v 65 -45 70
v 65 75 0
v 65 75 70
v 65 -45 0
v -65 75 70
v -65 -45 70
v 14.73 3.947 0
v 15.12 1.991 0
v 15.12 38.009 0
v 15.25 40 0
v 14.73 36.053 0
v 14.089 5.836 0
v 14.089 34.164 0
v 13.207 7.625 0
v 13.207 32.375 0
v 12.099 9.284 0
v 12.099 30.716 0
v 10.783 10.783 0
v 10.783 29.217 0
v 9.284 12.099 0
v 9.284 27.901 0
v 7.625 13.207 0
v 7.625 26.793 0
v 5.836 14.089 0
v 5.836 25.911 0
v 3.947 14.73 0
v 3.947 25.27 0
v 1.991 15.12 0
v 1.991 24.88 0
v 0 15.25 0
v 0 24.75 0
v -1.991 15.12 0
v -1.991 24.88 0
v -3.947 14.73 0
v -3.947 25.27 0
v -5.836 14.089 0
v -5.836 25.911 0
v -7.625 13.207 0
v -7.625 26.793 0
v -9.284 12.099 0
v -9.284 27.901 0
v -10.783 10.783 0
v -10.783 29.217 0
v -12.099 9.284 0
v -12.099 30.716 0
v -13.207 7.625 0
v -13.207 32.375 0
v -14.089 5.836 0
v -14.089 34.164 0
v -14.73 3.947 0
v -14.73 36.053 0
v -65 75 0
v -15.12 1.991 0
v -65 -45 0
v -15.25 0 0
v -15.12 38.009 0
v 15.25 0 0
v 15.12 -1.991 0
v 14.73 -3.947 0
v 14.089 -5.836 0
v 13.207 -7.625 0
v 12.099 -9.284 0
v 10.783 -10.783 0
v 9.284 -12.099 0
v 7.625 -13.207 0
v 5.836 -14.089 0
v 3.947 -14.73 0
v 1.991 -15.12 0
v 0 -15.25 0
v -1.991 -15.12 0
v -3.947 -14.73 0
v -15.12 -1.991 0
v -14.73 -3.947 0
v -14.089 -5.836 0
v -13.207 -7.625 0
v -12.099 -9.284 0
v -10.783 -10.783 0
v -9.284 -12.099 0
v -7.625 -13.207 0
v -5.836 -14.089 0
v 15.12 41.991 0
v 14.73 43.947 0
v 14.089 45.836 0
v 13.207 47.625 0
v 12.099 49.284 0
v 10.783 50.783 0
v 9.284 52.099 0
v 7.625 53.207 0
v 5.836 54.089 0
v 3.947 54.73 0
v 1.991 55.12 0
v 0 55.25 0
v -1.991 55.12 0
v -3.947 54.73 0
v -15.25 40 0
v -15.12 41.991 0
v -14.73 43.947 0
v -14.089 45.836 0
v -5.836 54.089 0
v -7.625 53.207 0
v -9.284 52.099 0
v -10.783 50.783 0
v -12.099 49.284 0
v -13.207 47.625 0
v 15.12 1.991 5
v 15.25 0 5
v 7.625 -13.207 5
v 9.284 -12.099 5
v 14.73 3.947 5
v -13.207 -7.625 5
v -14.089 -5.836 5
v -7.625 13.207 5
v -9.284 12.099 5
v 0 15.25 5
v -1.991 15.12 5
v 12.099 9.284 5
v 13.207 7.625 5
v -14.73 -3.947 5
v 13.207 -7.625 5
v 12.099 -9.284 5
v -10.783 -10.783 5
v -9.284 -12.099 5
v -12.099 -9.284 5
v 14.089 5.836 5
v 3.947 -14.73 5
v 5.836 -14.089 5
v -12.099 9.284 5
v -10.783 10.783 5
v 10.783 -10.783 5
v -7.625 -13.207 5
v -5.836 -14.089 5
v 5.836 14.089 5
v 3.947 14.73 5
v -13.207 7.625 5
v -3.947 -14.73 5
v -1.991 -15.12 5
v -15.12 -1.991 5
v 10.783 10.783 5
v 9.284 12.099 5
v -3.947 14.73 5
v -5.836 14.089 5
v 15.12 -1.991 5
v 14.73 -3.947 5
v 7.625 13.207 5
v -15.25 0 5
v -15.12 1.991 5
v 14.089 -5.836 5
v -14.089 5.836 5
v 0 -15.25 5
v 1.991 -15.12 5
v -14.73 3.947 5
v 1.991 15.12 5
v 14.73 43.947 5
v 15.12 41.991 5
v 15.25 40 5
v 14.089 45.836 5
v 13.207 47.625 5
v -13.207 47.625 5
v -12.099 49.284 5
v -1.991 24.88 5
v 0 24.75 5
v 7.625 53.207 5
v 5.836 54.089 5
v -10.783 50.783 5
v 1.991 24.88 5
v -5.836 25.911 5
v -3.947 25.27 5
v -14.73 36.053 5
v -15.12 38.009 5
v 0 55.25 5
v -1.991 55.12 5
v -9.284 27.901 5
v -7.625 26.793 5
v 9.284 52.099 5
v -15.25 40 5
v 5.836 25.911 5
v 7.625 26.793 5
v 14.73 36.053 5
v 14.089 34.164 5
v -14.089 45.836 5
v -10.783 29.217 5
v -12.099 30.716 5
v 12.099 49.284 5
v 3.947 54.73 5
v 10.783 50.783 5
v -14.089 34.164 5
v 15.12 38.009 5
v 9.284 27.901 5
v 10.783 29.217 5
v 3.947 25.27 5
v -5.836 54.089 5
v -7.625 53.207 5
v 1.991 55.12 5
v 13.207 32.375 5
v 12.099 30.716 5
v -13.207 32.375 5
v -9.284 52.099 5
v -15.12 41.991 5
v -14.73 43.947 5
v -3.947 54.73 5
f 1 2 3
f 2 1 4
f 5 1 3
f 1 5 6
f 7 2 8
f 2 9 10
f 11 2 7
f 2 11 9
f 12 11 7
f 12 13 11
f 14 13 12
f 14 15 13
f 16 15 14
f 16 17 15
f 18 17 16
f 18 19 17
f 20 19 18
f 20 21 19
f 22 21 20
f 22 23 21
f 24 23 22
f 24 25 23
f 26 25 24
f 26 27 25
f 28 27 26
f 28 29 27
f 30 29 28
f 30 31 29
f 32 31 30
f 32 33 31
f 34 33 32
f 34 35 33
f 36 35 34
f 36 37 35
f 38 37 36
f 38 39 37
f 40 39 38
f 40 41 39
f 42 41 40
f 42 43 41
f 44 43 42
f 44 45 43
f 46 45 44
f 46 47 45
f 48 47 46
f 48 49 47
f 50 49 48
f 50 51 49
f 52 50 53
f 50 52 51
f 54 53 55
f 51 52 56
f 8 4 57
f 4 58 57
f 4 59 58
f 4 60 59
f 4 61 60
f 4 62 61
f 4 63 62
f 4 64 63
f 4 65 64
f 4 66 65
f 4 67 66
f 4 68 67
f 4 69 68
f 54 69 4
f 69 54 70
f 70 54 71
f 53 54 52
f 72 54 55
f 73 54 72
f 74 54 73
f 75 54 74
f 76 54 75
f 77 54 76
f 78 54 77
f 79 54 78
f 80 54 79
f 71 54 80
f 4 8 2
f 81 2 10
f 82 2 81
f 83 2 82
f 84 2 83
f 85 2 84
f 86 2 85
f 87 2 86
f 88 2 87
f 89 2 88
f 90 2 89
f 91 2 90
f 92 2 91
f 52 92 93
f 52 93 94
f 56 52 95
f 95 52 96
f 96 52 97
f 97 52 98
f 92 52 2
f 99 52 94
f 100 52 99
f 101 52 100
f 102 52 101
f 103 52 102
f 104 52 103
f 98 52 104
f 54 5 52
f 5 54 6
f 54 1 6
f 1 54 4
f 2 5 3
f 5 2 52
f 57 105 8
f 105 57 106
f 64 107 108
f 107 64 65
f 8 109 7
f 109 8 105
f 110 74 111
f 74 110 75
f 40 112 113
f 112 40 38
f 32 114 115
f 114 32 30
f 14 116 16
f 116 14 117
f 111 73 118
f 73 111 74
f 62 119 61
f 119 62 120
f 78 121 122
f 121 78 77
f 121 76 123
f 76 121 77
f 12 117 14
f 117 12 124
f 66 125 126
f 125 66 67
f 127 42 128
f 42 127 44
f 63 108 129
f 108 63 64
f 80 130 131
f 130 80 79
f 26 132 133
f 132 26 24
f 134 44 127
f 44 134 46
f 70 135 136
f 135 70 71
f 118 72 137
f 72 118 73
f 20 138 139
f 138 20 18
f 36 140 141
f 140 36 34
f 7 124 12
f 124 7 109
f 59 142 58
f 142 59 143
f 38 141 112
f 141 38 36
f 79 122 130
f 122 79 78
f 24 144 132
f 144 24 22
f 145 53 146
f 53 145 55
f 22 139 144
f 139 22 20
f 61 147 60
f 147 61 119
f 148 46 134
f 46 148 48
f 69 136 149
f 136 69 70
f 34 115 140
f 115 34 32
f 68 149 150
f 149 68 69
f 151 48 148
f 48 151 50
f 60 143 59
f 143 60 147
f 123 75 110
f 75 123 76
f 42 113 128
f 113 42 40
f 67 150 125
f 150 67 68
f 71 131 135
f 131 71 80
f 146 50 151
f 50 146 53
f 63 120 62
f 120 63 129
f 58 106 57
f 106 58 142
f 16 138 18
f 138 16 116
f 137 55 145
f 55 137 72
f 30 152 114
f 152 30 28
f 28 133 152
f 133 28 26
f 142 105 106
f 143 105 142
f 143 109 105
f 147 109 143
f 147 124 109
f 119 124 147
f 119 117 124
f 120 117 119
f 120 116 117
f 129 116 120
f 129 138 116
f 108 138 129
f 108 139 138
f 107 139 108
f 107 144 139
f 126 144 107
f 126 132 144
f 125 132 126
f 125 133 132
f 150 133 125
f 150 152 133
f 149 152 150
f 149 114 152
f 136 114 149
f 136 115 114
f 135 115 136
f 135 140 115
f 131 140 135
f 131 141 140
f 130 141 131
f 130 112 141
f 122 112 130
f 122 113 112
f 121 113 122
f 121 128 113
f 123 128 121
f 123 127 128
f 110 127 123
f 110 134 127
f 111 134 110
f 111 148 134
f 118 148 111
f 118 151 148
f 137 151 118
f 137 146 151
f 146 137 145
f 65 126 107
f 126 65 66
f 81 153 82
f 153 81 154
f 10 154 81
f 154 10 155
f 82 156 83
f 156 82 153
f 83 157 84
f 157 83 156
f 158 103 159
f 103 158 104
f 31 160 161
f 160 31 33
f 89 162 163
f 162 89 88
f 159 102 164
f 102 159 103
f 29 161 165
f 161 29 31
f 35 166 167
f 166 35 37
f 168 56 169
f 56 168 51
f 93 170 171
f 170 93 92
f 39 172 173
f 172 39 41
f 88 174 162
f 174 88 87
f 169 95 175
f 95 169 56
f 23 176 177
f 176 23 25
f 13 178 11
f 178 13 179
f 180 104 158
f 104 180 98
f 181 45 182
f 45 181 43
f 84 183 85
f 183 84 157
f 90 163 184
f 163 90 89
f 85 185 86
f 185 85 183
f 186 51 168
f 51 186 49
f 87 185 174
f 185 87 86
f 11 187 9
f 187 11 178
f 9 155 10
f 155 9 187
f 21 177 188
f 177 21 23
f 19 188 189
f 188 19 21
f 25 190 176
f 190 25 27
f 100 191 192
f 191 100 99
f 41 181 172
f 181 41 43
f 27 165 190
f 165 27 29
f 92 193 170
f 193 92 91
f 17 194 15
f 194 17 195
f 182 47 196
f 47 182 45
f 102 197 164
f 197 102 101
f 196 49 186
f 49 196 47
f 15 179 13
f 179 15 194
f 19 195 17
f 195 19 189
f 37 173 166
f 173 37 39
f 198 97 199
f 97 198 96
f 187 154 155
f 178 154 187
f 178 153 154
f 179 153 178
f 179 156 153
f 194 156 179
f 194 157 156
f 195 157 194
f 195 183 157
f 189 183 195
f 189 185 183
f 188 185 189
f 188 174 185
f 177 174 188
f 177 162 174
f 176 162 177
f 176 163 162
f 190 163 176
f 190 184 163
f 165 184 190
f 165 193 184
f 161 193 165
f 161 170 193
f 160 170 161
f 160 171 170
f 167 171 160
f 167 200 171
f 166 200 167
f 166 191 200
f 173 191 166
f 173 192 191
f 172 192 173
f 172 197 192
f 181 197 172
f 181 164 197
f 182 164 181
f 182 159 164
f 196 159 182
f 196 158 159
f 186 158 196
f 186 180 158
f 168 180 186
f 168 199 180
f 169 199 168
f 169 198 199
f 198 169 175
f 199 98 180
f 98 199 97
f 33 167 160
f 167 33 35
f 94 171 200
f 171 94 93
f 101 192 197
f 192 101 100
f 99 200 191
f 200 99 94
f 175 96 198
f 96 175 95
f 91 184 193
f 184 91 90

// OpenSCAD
// Tube rack for six 50 mL conical (Falcon-type) tubes - printed upside down and flipped over.
// A flat plate with a 2x3 hole grid and two solid walls runs along the long edges. The two
// short ends are open. The walls and plate form a U-cross section along the length.
// NOVEL general part.

cols   = 3;
rows   = 2;
tube_d = 30.5;
pitch_x = 40;
pitch_y = 40;
plate_w = 130;
plate_l = 90;
plate_t = 4;
wall_h  = 70;

$fn = 48;

plate_n = cols * rows;

difference() {
    union() {
        translate([-plate_w / 2, -plate_l / 2, 0]) cube([plate_w, plate_l, plate_t]);
        for (i = [0 : cols - 1])
            translate([-plate_w / 2, -plate_l / 2 + i * pitch_y, 0]) cube([plate_w, pitch_y, wall_h]);
    }
    for (i = [0 : cols - 1], j = [0 : rows - 1])
        translate([0, j * pitch_y, -1])
            cylinder(h = plate_t + 2, d = tube_d);
}
